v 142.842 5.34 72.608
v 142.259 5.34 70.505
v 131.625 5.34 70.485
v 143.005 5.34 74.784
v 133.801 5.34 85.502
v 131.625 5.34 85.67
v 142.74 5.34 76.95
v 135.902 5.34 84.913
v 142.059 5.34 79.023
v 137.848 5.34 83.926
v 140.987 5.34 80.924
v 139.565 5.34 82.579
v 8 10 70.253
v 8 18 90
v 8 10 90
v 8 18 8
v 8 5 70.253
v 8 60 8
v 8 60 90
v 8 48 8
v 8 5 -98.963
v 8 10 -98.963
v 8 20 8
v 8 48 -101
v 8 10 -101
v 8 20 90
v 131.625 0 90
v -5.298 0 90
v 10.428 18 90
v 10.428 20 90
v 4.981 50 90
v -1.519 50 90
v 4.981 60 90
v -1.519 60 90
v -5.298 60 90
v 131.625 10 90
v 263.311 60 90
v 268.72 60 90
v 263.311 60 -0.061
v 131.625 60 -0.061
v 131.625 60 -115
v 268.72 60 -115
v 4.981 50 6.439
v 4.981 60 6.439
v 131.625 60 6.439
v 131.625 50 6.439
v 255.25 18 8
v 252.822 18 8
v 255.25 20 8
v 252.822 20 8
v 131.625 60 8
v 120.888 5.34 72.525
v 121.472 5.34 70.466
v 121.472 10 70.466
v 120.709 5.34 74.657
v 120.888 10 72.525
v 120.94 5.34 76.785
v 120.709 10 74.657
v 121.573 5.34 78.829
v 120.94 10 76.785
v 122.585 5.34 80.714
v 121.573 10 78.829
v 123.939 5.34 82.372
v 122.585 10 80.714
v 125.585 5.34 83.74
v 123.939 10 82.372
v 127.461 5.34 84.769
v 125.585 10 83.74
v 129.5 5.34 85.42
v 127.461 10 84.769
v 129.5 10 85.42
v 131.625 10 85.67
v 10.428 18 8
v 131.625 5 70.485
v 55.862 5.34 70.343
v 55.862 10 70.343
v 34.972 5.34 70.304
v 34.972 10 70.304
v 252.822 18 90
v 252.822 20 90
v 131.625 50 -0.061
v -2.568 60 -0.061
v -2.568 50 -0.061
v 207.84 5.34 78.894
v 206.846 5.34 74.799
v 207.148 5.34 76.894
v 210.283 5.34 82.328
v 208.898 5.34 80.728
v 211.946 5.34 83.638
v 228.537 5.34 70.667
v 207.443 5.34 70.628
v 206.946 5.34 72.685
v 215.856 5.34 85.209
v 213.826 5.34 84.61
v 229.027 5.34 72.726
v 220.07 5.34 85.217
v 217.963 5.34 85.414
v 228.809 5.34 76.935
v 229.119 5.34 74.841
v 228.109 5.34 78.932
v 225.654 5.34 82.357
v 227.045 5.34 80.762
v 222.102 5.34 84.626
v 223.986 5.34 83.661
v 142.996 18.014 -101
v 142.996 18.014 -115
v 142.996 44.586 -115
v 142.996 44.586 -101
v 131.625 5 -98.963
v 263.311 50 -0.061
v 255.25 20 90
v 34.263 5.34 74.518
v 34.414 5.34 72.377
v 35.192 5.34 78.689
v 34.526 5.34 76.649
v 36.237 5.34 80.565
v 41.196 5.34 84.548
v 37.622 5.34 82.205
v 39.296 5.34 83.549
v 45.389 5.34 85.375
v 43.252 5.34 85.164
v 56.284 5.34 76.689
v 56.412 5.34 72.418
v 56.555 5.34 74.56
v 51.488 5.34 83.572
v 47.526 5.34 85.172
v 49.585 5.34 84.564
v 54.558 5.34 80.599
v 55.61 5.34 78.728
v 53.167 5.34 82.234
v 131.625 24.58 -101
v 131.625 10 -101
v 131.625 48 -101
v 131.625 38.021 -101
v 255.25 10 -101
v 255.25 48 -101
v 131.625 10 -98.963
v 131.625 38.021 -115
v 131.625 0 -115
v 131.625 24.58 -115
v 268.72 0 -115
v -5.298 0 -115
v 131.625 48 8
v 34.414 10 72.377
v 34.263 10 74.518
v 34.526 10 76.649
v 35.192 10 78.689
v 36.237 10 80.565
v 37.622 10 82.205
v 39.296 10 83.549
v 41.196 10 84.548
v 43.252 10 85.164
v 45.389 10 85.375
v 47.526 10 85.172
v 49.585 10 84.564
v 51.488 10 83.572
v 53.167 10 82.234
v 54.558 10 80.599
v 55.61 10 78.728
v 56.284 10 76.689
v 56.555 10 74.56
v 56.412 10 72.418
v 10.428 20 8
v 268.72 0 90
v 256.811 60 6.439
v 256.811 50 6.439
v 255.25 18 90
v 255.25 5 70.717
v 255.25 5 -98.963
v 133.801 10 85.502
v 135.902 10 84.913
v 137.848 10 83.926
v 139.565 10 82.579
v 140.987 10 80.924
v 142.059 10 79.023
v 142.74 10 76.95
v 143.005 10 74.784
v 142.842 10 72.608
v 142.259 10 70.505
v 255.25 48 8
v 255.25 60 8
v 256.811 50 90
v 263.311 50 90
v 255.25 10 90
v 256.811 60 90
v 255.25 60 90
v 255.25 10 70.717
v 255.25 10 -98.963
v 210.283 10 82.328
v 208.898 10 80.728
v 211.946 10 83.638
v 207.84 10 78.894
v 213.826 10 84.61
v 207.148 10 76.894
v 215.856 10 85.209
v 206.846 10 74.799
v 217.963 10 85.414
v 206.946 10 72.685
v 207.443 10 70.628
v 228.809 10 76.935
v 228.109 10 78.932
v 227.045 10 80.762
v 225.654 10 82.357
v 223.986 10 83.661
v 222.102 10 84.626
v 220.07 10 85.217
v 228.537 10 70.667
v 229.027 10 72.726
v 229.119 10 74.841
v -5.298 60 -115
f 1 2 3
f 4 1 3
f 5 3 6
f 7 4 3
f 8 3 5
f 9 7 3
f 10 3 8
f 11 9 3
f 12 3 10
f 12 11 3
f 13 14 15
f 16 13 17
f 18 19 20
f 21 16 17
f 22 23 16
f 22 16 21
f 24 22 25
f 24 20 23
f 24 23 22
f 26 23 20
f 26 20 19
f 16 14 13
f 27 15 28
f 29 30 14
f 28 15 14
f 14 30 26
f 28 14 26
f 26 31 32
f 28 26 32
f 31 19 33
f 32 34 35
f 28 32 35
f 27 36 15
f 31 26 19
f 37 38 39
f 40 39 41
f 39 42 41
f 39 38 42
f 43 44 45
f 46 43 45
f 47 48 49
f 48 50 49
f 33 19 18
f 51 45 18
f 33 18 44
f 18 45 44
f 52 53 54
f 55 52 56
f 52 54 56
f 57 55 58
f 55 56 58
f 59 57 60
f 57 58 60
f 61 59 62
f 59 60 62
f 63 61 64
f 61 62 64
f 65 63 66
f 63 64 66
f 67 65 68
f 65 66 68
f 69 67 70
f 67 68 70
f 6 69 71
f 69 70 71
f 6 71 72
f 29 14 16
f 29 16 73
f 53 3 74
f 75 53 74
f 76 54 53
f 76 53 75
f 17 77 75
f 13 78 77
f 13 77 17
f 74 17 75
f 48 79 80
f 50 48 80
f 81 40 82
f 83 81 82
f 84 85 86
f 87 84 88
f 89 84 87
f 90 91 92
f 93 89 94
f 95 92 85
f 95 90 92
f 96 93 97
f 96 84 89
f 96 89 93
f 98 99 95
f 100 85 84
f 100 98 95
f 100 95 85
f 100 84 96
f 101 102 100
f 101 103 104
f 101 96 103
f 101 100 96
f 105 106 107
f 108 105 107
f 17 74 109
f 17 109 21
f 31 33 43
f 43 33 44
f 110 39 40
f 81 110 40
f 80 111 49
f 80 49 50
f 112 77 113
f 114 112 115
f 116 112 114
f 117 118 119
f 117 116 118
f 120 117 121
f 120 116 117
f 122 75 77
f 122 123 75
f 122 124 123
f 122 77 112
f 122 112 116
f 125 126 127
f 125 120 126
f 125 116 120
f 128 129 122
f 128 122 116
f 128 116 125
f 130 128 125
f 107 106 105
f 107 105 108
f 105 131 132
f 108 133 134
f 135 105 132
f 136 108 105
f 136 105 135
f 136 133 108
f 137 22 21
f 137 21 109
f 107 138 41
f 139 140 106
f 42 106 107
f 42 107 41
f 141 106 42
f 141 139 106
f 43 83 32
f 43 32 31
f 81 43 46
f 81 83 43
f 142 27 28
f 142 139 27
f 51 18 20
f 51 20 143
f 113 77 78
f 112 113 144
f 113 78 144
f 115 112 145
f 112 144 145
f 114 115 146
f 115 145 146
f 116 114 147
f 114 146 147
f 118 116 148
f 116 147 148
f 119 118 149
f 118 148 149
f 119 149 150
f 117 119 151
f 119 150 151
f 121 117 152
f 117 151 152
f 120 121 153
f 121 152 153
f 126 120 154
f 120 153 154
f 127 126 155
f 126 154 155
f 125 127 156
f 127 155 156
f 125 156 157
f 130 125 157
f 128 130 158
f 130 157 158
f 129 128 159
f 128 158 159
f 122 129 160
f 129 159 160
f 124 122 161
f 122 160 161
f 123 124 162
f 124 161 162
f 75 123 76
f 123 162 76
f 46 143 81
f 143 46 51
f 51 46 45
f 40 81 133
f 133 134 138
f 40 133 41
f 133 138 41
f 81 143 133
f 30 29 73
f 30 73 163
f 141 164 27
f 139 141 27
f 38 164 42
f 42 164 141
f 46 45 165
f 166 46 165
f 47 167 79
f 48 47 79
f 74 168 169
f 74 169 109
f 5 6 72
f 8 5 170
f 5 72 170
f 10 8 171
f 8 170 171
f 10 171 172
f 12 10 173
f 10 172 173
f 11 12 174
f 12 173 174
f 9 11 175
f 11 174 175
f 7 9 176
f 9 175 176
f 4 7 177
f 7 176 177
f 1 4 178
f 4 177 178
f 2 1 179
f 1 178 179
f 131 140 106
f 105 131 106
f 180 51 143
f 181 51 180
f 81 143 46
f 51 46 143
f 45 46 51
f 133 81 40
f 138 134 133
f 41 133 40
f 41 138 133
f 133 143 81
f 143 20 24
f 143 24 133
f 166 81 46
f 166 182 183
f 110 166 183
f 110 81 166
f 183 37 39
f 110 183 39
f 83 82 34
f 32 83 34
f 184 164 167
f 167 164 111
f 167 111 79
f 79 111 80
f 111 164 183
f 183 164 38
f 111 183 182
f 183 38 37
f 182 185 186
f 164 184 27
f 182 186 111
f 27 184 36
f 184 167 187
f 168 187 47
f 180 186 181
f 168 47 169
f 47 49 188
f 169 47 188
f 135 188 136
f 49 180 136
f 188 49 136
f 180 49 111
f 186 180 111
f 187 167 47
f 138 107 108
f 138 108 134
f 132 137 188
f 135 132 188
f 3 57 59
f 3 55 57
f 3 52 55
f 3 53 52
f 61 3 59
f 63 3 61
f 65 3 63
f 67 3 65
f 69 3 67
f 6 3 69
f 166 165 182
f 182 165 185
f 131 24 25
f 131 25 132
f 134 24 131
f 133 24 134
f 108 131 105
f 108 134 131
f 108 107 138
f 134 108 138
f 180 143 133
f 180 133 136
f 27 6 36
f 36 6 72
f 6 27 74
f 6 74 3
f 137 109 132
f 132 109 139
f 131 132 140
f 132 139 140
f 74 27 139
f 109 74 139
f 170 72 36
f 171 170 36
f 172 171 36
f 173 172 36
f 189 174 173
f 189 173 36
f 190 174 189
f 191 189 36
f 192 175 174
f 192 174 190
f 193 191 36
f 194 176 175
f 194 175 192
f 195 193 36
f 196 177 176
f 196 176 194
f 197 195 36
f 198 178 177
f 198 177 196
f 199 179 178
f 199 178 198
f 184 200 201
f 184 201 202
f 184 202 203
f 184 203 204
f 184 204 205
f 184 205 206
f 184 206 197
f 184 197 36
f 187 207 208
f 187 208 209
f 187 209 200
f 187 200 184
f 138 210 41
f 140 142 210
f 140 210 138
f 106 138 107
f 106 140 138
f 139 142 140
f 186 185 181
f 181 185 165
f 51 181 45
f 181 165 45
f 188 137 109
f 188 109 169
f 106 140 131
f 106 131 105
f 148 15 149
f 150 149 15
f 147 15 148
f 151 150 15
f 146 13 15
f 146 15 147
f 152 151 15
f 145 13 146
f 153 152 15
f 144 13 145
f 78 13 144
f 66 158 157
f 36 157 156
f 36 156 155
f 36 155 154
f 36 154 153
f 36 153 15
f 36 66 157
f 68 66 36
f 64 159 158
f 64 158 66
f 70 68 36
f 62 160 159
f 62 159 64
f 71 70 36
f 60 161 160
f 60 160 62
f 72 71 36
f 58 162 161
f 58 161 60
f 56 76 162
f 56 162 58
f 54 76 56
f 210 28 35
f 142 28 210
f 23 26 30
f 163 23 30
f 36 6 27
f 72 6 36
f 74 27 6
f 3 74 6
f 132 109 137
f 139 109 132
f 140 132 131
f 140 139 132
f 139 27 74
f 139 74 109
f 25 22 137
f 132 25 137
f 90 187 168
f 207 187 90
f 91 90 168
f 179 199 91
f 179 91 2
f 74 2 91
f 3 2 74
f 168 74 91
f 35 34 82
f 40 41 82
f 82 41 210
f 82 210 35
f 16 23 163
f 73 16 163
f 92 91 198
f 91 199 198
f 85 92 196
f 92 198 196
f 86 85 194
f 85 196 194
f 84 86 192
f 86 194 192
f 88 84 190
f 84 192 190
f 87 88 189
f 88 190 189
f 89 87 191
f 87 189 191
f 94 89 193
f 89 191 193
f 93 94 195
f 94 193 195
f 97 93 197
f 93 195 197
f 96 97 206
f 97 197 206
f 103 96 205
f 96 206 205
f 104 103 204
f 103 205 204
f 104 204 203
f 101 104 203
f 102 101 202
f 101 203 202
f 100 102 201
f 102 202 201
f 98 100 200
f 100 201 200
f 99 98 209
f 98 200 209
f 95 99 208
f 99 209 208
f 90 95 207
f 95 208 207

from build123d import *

# Parameters (mm, degrees)
BOSS_EXTRUDE1_DEPTH    = 60
CUT_EXTRUDE1_DEPTH     = 10
SKETCH5_W              = 247.25
SKETCH5_H              = 82
CUT_EXTRUDE2_DEPTH     = 50
SKETCH6_R              = 11.15
CUT_EXTRUDE3_DEPTH     = 4.66
CUT_EXTRUDE4_DEPTH     = 5
SKETCH9_W              = 2.428238535
SKETCH9_H              = 2
BOSS_EXTRUDE3_DEPTH    = 85
SKETCH11_W             = 247.25
SKETCH11_H             = 38
CUT_EXTRUDE6_DEPTH     = 109
SPLIT3_SURFACE_1_BACK  = 348.434
SPLIT3_SURFACE_1_DEPTH = 696.868
SPLIT3_SURFACE_2_BACK  = 348.434
SPLIT3_SURFACE_2_DEPTH = 696.868


with BuildPart() as part:
    # Sketch1 → Boss-Extrude1 (new body)
    with BuildSketch(Plane(origin=(0, 0, 0), x_dir=(1, 0, 0), z_dir=(0, 1, 0))):
        Polygon((263, -90), (0, -90), (-5.297672508, -90), (-5.297672508, 115), (268.719836564, 115), (268.719836564, 109.817232955), (268.719836564, 5.622236561), (268.719836564, -90), align=None)
    extrude(amount=BOSS_EXTRUDE1_DEPTH)

    # Sketch4 → Cut-Extrude1 (cut)
    with BuildSketch(Plane(origin=(0, 60, 0), x_dir=(1, 0, 0), z_dir=(0, 1, 0))):
        Polygon((-1.518607935, -90.000001141), (4.981392065, -90), (4.981392065, -6.438755439), (256.811190639, -6.438755439), (256.811190639, -90), (263.311190639, -90), (263.311190639, 0.061244561), (-2.567831993, 0.061244561), align=None)
    extrude(amount=-CUT_EXTRUDE1_DEPTH, mode=Mode.SUBTRACT)

    # Sketch5 → Cut-Extrude2 (cut)
    with BuildSketch(Plane(origin=(0, 60, 0), x_dir=(1, 0, 0), z_dir=(0, 1, 0))):
        with Locations((131.625, -49)):
            Rectangle(SKETCH5_W, SKETCH5_H)
    extrude(amount=-CUT_EXTRUDE2_DEPTH, mode=Mode.SUBTRACT)

    # Sketch6 → Cut-Extrude3 (cut)
    with BuildSketch(Plane(origin=(0, 10, 0), x_dir=(1, 0, 0), z_dir=(0, 1, 0))):
        with Locations(Location((131.857766281, -74.522104322, 0), (0, 0, 270))):
            Circle(SKETCH6_R)
        with Locations(Location((45.409631344, -74.22492571, 0), (0, 0, 270))):
            Circle(SKETCH6_R)
        with Locations(Location((217.983549657, -74.264123819, 0), (0, 0, 270))):
            Circle(SKETCH6_R)
    extrude(amount=-CUT_EXTRUDE3_DEPTH, mode=Mode.SUBTRACT)

    # Sketch7 → Cut-Extrude4 (cut)
    with BuildSketch(Plane(origin=(0, 10, 0), x_dir=(1, 0, 0), z_dir=(0, 1, 0))):
        Polygon((8, -70.253012436), (8, 98.962802173), (255.25, 98.962802173), (255.25, -70.717283821), align=None)
    extrude(amount=-CUT_EXTRUDE4_DEPTH, mode=Mode.SUBTRACT)

    # Sketch9 → Boss-Extrude3 (add)
    with BuildSketch(Plane.XY.offset(90)):
        with Locations((9.214119267, 19)):
            Rectangle(SKETCH9_W, SKETCH9_H)
    boss_extrude3 = extrude(amount=-BOSS_EXTRUDE3_DEPTH)

    # Mirror1: Boss-Extrude3 across plane
    add(boss_extrude3.mirror(Plane(origin=(131.625, 0, 0), x_dir=(0, 0, 1), z_dir=(1, 0, 0))))

    # Sketch11 → Cut-Extrude6 (cut)
    with BuildSketch(Plane.XY.offset(8)):
        with Locations((131.625, 29)):
            Rectangle(SKETCH11_W, SKETCH11_H)
    extrude(amount=-CUT_EXTRUDE6_DEPTH, mode=Mode.SUBTRACT)


with BuildPart() as body_2:
    # Split3: the piece behind the surface
    add(part.part)
    # Split3 surface: a surface, the sketch's curves swept straight by 696.868 mm
    with BuildLine(Plane.XY.offset(-101).offset(-SPLIT3_SURFACE_1_BACK), mode=Mode.PRIVATE) as split3_surface_1_path:
        Line((131.625, 38.021015206), (131.625, 59.950755183))
        Line((131.625, 59.950755183), (131.625, 64.27398998))
        Line((131.625, 64.27398998), (-5.297672508, 64.27398998))
        Line((-5.297672508, 64.27398998), (-5.297672508, 0))
        Line((-5.297672508, 0), (131.625, -0.05437829))
        Line((131.625, -0.05437829), (131.625, 24.579650238))
        Line((131.625, 24.579650238), (142.996381437, 18.014380104))
        Line((142.996381437, 18.014380104), (142.996381437, 44.58628534))
        Line((142.996381437, 44.58628534), (131.625, 38.021015206))
    split3_surface_1 = Shell.extrude(split3_surface_1_path.wire(), (0 * SPLIT3_SURFACE_1_DEPTH, 0 * SPLIT3_SURFACE_1_DEPTH, 1 * SPLIT3_SURFACE_1_DEPTH))
    split(bisect_by=split3_surface_1, keep=Keep.BOTTOM)


with BuildPart() as part_1:
    add(part.part)

    # Split3: split by a surface, the side it looks to stays
    # Split3 surface: a surface, the sketch's curves swept straight by 696.868 mm
    with BuildLine(Plane.XY.offset(-101).offset(-SPLIT3_SURFACE_2_BACK), mode=Mode.PRIVATE) as split3_surface_2_path:
        Line((131.625, 38.021015206), (131.625, 59.950755183))
        Line((131.625, 59.950755183), (131.625, 64.27398998))
        Line((131.625, 64.27398998), (-5.297672508, 64.27398998))
        Line((-5.297672508, 64.27398998), (-5.297672508, 0))
        Line((-5.297672508, 0), (131.625, -0.05437829))
        Line((131.625, -0.05437829), (131.625, 24.579650238))
        Line((131.625, 24.579650238), (142.996381437, 18.014380104))
        Line((142.996381437, 18.014380104), (142.996381437, 44.58628534))
        Line((142.996381437, 44.58628534), (131.625, 38.021015206))
    split3_surface_2 = Shell.extrude(split3_surface_2_path.wire(), (0 * SPLIT3_SURFACE_2_DEPTH, 0 * SPLIT3_SURFACE_2_DEPTH, 1 * SPLIT3_SURFACE_2_DEPTH))
    split(bisect_by=split3_surface_2, keep=Keep.TOP)


solid = Compound([body_2.part, part_1.part])
